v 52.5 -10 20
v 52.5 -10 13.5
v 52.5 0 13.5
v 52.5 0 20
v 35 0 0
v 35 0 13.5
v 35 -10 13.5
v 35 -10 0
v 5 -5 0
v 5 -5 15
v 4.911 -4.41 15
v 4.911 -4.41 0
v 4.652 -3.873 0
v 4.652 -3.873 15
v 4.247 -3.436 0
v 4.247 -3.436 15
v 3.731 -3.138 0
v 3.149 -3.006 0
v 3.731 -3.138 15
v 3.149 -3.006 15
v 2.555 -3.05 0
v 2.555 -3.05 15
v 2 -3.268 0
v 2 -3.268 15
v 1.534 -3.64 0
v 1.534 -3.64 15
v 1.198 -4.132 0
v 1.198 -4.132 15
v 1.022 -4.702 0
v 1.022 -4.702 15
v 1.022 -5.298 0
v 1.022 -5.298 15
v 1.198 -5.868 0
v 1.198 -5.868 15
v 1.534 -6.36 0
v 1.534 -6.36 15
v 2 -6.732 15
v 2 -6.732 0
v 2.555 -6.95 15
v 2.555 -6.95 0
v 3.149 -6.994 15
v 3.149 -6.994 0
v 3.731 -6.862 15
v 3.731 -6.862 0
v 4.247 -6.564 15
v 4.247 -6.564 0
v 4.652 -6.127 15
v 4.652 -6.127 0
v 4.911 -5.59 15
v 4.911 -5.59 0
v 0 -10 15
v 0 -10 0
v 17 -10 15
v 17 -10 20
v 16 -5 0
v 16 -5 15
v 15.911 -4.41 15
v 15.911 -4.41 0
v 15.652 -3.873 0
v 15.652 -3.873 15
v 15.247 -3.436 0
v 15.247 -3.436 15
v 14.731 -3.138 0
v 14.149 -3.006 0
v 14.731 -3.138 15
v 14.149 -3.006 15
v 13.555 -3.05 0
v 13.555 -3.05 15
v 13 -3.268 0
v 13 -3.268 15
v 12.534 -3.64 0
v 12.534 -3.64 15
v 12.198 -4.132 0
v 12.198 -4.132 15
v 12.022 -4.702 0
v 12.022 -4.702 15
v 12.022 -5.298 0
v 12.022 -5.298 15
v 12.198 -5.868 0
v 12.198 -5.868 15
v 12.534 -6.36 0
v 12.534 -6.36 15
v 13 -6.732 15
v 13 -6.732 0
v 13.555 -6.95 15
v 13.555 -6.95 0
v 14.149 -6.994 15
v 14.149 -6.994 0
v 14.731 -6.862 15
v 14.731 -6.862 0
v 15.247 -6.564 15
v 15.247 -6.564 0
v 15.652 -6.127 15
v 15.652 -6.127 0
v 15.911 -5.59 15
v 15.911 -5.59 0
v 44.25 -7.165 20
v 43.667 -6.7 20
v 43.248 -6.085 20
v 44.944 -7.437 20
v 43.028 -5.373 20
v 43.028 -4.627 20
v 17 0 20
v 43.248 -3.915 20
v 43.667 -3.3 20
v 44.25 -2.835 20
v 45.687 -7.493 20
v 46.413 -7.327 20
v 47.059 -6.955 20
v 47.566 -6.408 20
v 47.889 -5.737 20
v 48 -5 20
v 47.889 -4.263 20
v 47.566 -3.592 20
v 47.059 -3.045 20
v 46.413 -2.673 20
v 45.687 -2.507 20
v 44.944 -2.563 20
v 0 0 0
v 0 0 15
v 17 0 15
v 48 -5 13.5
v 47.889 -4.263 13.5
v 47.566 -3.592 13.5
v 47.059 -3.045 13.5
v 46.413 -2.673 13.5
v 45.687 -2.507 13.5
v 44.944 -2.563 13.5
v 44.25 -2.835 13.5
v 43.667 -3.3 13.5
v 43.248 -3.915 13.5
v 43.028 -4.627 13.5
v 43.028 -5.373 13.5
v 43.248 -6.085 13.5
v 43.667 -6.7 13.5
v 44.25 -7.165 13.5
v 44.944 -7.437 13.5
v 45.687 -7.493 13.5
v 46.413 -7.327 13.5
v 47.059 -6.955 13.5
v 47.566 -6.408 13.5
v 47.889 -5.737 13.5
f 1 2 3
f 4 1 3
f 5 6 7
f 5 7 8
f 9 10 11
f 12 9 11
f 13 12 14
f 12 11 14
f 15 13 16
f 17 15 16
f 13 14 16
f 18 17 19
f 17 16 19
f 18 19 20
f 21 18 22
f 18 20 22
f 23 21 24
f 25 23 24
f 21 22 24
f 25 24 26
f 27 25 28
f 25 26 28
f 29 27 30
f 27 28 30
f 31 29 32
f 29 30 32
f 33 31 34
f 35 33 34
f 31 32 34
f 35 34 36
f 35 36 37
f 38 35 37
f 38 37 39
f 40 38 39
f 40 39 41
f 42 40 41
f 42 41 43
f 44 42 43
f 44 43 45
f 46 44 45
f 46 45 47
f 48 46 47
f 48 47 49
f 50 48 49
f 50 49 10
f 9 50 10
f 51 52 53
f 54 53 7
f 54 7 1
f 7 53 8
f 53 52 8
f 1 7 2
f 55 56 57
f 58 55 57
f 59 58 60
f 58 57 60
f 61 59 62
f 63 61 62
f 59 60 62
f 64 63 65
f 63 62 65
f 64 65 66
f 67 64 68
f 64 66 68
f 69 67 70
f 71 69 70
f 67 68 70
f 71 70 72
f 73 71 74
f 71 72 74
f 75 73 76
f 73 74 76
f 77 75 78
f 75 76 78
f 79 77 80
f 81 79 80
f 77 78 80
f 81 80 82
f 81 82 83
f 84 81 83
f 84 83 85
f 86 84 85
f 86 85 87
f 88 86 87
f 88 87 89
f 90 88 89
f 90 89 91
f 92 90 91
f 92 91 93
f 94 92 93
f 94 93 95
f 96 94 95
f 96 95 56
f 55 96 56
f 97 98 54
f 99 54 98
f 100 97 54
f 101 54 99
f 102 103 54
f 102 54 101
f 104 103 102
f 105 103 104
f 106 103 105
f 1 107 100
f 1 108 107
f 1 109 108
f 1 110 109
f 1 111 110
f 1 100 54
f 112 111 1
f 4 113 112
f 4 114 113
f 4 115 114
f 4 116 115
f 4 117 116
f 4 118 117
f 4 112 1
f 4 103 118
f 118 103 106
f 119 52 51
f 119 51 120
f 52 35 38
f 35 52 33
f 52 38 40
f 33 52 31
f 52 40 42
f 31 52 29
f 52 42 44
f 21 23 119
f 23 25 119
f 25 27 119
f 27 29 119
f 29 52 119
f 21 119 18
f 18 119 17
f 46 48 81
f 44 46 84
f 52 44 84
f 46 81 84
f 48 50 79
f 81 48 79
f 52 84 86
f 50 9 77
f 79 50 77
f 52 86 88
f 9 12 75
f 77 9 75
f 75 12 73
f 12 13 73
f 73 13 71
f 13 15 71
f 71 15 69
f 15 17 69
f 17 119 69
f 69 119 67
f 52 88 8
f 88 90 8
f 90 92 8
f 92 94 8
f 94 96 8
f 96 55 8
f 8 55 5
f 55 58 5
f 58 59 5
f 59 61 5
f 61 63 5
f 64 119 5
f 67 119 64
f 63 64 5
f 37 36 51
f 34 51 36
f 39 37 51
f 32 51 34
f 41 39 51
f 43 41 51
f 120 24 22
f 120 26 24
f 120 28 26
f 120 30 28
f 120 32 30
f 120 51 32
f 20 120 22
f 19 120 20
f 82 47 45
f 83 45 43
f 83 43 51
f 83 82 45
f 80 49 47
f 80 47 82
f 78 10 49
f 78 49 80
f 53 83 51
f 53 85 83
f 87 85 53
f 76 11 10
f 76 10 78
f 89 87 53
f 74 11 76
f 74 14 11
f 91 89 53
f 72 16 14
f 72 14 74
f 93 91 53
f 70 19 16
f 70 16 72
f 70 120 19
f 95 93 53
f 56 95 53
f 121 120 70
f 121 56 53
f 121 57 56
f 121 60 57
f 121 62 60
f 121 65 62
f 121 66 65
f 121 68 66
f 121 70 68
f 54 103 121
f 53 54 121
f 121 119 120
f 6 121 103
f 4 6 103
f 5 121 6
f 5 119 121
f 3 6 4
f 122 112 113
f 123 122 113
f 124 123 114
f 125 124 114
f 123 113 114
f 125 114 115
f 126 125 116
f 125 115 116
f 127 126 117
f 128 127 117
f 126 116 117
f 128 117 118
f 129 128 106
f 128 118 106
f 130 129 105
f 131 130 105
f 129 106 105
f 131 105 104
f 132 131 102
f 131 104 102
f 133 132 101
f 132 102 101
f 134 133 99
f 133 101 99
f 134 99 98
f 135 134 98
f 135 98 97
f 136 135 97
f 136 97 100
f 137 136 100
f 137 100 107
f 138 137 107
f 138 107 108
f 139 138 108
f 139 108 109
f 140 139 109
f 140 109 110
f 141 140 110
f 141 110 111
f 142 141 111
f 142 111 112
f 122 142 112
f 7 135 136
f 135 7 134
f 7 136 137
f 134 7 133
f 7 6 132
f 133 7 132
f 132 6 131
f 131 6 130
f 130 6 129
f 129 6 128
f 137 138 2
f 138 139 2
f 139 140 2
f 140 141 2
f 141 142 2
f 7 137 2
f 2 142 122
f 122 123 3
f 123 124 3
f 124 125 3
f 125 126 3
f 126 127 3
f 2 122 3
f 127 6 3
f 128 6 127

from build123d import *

# Parameters (mm, degrees)
ESQUISSE1_W      = 52.5
ESQUISSE1_H      = 10
EXTRUSION1_DEPTH = 20
ESQUISSE3_R      = 2
EXTRUSION3_DEPTH = 21
ESQUISSE4_R      = 2.5
EXTRUSION4_DEPTH = 20
ESQUISSE2_W      = 17
ESQUISSE2_H      = 5
ESQUISSE2_W_2    = 17.5
ESQUISSE2_H_2    = 13.5
EXTRUSION5_DEPTH = 20


with BuildPart() as part:
    # Esquisse1 → Extrusion1 (new body)
    with BuildSketch(Plane.XY):
        with Locations((26.25, -5)):
            Rectangle(ESQUISSE1_W, ESQUISSE1_H)
    extrude(amount=EXTRUSION1_DEPTH)

    # Esquisse3 → Extrusion3 (cut, through all)
    with BuildSketch(Plane.XY.offset(20)):
        with Locations((3, -5)):
            Circle(ESQUISSE3_R)
        with Locations((14, -5)):
            Circle(ESQUISSE3_R)
    extrude(amount=-EXTRUSION3_DEPTH, mode=Mode.SUBTRACT)

    # Esquisse4 → Extrusion4 (cut)
    with BuildSketch(Plane.XY.offset(20)):
        with Locations((45.5, -5)):
            Circle(ESQUISSE4_R)
    extrude(amount=-EXTRUSION4_DEPTH, mode=Mode.SUBTRACT)

    # Esquisse2 → Extrusion5 (cut)
    with BuildSketch(Plane(origin=(0, 0, 0), x_dir=(1, 0, 0), z_dir=(0, 1, 0))):
        with Locations((8.5, -17.5)):
            Rectangle(ESQUISSE2_W, ESQUISSE2_H)
        with Locations((43.75, -6.75)):
            Rectangle(ESQUISSE2_W_2, ESQUISSE2_H_2)
    extrude(amount=-EXTRUSION5_DEPTH, mode=Mode.SUBTRACT)


solid = part.part
